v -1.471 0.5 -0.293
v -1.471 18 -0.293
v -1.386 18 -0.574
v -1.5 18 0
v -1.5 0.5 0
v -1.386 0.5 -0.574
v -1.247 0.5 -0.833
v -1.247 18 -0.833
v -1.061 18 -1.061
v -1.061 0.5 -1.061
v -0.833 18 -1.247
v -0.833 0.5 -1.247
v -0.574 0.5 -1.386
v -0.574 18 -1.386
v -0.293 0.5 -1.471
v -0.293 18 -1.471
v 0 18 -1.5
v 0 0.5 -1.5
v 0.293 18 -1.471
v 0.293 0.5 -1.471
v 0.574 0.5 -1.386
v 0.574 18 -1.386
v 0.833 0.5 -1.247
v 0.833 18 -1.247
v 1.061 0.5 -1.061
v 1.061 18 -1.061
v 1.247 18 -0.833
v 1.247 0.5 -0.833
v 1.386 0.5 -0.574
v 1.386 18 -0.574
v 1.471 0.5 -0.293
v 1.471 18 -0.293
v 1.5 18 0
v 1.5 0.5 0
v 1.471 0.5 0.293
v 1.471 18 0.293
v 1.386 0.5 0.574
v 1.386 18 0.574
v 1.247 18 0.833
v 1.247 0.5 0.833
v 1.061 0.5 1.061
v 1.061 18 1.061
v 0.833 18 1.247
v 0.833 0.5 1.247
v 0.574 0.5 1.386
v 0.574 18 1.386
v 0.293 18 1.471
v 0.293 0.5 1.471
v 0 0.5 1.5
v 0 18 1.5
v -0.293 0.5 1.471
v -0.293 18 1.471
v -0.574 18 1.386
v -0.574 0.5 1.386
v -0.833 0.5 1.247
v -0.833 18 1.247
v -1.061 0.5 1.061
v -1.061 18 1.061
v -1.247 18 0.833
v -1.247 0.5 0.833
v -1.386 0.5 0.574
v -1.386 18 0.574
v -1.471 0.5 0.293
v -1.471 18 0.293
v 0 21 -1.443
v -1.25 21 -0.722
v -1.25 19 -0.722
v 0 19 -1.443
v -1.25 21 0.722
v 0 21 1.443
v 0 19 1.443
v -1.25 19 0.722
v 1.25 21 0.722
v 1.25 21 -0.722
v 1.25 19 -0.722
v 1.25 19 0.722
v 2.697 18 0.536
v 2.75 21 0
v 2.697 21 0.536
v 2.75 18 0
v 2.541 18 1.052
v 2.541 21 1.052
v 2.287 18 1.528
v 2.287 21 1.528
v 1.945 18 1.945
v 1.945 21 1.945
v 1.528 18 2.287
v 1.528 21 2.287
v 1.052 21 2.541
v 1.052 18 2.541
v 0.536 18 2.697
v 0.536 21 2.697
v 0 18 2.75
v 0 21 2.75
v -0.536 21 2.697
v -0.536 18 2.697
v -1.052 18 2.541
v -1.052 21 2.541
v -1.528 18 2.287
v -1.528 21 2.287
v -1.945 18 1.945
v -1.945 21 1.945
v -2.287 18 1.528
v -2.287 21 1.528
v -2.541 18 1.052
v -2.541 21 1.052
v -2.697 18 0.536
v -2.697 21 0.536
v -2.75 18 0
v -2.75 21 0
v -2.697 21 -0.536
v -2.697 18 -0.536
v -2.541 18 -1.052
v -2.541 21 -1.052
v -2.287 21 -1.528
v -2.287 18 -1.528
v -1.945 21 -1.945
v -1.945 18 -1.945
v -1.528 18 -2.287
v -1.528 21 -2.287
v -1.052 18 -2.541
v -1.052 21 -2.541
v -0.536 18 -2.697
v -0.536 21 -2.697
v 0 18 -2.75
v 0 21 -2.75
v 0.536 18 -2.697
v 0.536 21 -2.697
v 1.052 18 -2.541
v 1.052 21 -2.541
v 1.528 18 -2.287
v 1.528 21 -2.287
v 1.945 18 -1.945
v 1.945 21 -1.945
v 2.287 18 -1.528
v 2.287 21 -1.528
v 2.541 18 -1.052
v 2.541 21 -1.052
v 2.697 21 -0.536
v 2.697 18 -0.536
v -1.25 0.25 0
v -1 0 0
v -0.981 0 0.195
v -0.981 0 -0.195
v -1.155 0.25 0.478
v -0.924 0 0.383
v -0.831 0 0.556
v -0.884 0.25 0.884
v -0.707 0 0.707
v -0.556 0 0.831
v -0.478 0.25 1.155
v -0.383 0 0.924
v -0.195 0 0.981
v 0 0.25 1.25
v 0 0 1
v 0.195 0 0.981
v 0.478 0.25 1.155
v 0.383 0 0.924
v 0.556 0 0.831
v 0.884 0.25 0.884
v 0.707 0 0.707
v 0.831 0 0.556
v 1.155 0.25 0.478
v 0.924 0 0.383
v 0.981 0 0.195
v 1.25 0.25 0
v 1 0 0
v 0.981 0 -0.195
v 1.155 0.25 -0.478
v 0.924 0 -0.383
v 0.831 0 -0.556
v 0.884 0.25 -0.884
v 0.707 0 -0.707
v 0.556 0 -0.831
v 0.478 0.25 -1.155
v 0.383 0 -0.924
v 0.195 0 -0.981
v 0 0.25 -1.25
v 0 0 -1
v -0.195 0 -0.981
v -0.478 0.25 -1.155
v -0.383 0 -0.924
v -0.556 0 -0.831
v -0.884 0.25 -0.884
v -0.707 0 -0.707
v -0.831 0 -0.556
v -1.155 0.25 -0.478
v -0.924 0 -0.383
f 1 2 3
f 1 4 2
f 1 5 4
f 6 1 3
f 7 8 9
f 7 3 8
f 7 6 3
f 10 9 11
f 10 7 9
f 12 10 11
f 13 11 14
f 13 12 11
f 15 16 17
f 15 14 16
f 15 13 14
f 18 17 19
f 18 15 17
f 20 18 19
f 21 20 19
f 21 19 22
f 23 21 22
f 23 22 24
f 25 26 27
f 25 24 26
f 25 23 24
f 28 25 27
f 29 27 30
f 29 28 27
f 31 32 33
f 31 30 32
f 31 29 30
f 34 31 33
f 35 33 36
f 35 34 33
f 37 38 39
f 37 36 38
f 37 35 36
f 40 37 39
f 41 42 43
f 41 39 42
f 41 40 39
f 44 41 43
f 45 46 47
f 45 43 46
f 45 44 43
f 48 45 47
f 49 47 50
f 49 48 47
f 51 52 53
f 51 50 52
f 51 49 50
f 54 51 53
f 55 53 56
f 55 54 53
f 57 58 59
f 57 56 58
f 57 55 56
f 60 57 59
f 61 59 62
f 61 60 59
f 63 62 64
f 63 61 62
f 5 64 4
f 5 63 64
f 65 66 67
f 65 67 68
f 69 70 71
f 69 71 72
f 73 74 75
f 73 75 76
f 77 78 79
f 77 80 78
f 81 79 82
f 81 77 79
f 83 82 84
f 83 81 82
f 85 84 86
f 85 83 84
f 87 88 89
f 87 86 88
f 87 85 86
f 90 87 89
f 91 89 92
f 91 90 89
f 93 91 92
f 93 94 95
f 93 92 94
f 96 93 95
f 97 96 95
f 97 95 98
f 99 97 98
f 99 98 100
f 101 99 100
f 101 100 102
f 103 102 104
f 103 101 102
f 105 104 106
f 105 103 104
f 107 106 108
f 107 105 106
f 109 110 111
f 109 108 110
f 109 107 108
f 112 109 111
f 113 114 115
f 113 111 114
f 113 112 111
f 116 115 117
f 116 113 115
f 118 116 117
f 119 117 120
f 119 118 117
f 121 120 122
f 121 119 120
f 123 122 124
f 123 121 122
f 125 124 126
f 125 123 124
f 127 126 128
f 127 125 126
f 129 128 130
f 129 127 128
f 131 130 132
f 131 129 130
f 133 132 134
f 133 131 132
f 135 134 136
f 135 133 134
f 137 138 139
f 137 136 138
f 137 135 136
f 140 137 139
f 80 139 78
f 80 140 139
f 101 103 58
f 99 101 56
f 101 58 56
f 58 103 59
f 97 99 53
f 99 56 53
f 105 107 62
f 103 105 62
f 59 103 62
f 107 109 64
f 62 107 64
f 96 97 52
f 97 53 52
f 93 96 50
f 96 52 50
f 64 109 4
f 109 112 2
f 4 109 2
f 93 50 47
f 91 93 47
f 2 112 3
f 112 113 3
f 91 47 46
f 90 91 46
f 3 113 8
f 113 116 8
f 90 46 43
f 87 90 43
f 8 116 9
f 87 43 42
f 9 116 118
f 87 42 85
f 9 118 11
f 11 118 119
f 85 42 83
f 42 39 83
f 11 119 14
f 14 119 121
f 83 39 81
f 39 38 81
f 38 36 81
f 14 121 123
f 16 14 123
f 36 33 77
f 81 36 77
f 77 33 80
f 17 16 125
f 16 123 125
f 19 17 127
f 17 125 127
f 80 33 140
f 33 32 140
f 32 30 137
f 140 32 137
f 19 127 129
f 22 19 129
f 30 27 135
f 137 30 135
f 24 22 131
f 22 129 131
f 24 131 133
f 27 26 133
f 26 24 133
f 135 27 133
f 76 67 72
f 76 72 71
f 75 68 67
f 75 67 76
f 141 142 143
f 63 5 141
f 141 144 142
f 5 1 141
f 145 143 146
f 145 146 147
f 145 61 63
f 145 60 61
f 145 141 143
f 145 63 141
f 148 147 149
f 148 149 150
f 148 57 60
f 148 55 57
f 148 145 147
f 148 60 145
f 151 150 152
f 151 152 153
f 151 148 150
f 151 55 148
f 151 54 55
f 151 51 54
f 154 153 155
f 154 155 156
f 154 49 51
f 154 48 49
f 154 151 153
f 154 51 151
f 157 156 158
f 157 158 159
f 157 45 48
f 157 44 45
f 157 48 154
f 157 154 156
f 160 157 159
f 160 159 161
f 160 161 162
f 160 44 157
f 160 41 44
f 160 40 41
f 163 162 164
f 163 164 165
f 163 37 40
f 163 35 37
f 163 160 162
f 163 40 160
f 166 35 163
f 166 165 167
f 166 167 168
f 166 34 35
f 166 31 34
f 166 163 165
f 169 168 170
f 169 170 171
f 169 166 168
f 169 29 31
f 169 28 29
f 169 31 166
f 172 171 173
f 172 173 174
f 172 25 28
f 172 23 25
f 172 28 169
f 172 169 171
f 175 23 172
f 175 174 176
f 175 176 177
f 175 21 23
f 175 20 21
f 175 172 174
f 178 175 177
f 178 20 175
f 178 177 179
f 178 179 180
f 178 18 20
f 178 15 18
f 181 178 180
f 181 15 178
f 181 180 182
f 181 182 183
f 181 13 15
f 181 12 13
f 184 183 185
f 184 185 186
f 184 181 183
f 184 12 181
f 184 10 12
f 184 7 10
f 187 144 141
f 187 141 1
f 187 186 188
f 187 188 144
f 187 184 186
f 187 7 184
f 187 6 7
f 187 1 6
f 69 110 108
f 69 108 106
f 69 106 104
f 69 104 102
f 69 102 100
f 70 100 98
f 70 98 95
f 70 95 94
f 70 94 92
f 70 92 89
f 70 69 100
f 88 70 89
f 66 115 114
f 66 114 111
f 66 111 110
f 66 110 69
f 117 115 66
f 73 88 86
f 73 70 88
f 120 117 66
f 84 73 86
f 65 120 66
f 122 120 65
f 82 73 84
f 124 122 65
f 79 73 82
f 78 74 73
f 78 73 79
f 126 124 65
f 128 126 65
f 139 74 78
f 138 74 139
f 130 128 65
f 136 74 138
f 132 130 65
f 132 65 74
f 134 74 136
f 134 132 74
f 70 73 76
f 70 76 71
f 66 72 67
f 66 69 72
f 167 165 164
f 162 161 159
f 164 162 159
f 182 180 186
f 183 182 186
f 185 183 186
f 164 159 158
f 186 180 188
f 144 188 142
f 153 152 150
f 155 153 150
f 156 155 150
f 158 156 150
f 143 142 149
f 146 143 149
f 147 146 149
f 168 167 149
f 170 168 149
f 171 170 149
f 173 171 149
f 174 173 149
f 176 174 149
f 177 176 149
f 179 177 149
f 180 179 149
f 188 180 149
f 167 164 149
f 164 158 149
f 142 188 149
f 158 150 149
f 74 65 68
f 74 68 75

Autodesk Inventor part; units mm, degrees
ref_plane "YZ Plane" through (0, 0, 0) normal (1, 0, 0) x (0, 1, 0)
ref_plane "XZ Plane" through (0, 0, 0) normal (0, 1, 0) x (-1, 0, 0)
ref_plane "XY Plane" through (0, 0, 0) normal (0, 0, 1) x (1, 0, 0)
sketch "Sketch1" plane through (0, 0, 0) normal (0, 1, 0) x (-1, 0, 0)
  circle A0 centre (0, 0) radius 1.5
  dimension "d0" = 3
extrude "Extrusion1" add sketch "Sketch1" along normal blind 18
sketch "Sketch2" plane through (0, 18, 0) normal (0, 1, 0) x (1, 0, 0)
  circle A0 centre (0, 0) radius 1.5 projected
  circle A1 centre (0, 0) radius 2.75
  dimension "d3" = 5.5
extrude "Extrusion2" add sketch "Sketch2" along normal blind 3 contours A0 | A1
sketch "Sketch3" plane through (0, 21, 0) normal (0, 1, 0) x (1, 0, 0)
  circle A0 centre (0, 0) radius 2.75 projected
  line L0 (0, 1.4434) -> (1.25, 0.7217)
  line L1 (1.25, 0.7217) -> (1.25, -0.7217)
  line L2 (1.25, -0.7217) -> (0, -1.4434)
  line L3 (0, -1.4434) -> (-1.25, -0.7217)
  line L4 (-1.25, -0.7217) -> (-1.25, 0.7217)
  line L5 (-1.25, 0.7217) -> (0, 1.4434)
  dimension "d6" = 2.5
extrude "Extrusion3" cut sketch "Sketch3" against normal blind 2 contours L0 L1 L2 L3 L4 L5
thread "Thread1" size "M3x0.5" class "6g" standard "ANSI Metric M Profile" full length
chamfer "Chamfer1" distance 0.5 angle 45 1 edges at (1.5, 0, 0)
properties part number "M3x18SHCS" material "Stainless Steel"
